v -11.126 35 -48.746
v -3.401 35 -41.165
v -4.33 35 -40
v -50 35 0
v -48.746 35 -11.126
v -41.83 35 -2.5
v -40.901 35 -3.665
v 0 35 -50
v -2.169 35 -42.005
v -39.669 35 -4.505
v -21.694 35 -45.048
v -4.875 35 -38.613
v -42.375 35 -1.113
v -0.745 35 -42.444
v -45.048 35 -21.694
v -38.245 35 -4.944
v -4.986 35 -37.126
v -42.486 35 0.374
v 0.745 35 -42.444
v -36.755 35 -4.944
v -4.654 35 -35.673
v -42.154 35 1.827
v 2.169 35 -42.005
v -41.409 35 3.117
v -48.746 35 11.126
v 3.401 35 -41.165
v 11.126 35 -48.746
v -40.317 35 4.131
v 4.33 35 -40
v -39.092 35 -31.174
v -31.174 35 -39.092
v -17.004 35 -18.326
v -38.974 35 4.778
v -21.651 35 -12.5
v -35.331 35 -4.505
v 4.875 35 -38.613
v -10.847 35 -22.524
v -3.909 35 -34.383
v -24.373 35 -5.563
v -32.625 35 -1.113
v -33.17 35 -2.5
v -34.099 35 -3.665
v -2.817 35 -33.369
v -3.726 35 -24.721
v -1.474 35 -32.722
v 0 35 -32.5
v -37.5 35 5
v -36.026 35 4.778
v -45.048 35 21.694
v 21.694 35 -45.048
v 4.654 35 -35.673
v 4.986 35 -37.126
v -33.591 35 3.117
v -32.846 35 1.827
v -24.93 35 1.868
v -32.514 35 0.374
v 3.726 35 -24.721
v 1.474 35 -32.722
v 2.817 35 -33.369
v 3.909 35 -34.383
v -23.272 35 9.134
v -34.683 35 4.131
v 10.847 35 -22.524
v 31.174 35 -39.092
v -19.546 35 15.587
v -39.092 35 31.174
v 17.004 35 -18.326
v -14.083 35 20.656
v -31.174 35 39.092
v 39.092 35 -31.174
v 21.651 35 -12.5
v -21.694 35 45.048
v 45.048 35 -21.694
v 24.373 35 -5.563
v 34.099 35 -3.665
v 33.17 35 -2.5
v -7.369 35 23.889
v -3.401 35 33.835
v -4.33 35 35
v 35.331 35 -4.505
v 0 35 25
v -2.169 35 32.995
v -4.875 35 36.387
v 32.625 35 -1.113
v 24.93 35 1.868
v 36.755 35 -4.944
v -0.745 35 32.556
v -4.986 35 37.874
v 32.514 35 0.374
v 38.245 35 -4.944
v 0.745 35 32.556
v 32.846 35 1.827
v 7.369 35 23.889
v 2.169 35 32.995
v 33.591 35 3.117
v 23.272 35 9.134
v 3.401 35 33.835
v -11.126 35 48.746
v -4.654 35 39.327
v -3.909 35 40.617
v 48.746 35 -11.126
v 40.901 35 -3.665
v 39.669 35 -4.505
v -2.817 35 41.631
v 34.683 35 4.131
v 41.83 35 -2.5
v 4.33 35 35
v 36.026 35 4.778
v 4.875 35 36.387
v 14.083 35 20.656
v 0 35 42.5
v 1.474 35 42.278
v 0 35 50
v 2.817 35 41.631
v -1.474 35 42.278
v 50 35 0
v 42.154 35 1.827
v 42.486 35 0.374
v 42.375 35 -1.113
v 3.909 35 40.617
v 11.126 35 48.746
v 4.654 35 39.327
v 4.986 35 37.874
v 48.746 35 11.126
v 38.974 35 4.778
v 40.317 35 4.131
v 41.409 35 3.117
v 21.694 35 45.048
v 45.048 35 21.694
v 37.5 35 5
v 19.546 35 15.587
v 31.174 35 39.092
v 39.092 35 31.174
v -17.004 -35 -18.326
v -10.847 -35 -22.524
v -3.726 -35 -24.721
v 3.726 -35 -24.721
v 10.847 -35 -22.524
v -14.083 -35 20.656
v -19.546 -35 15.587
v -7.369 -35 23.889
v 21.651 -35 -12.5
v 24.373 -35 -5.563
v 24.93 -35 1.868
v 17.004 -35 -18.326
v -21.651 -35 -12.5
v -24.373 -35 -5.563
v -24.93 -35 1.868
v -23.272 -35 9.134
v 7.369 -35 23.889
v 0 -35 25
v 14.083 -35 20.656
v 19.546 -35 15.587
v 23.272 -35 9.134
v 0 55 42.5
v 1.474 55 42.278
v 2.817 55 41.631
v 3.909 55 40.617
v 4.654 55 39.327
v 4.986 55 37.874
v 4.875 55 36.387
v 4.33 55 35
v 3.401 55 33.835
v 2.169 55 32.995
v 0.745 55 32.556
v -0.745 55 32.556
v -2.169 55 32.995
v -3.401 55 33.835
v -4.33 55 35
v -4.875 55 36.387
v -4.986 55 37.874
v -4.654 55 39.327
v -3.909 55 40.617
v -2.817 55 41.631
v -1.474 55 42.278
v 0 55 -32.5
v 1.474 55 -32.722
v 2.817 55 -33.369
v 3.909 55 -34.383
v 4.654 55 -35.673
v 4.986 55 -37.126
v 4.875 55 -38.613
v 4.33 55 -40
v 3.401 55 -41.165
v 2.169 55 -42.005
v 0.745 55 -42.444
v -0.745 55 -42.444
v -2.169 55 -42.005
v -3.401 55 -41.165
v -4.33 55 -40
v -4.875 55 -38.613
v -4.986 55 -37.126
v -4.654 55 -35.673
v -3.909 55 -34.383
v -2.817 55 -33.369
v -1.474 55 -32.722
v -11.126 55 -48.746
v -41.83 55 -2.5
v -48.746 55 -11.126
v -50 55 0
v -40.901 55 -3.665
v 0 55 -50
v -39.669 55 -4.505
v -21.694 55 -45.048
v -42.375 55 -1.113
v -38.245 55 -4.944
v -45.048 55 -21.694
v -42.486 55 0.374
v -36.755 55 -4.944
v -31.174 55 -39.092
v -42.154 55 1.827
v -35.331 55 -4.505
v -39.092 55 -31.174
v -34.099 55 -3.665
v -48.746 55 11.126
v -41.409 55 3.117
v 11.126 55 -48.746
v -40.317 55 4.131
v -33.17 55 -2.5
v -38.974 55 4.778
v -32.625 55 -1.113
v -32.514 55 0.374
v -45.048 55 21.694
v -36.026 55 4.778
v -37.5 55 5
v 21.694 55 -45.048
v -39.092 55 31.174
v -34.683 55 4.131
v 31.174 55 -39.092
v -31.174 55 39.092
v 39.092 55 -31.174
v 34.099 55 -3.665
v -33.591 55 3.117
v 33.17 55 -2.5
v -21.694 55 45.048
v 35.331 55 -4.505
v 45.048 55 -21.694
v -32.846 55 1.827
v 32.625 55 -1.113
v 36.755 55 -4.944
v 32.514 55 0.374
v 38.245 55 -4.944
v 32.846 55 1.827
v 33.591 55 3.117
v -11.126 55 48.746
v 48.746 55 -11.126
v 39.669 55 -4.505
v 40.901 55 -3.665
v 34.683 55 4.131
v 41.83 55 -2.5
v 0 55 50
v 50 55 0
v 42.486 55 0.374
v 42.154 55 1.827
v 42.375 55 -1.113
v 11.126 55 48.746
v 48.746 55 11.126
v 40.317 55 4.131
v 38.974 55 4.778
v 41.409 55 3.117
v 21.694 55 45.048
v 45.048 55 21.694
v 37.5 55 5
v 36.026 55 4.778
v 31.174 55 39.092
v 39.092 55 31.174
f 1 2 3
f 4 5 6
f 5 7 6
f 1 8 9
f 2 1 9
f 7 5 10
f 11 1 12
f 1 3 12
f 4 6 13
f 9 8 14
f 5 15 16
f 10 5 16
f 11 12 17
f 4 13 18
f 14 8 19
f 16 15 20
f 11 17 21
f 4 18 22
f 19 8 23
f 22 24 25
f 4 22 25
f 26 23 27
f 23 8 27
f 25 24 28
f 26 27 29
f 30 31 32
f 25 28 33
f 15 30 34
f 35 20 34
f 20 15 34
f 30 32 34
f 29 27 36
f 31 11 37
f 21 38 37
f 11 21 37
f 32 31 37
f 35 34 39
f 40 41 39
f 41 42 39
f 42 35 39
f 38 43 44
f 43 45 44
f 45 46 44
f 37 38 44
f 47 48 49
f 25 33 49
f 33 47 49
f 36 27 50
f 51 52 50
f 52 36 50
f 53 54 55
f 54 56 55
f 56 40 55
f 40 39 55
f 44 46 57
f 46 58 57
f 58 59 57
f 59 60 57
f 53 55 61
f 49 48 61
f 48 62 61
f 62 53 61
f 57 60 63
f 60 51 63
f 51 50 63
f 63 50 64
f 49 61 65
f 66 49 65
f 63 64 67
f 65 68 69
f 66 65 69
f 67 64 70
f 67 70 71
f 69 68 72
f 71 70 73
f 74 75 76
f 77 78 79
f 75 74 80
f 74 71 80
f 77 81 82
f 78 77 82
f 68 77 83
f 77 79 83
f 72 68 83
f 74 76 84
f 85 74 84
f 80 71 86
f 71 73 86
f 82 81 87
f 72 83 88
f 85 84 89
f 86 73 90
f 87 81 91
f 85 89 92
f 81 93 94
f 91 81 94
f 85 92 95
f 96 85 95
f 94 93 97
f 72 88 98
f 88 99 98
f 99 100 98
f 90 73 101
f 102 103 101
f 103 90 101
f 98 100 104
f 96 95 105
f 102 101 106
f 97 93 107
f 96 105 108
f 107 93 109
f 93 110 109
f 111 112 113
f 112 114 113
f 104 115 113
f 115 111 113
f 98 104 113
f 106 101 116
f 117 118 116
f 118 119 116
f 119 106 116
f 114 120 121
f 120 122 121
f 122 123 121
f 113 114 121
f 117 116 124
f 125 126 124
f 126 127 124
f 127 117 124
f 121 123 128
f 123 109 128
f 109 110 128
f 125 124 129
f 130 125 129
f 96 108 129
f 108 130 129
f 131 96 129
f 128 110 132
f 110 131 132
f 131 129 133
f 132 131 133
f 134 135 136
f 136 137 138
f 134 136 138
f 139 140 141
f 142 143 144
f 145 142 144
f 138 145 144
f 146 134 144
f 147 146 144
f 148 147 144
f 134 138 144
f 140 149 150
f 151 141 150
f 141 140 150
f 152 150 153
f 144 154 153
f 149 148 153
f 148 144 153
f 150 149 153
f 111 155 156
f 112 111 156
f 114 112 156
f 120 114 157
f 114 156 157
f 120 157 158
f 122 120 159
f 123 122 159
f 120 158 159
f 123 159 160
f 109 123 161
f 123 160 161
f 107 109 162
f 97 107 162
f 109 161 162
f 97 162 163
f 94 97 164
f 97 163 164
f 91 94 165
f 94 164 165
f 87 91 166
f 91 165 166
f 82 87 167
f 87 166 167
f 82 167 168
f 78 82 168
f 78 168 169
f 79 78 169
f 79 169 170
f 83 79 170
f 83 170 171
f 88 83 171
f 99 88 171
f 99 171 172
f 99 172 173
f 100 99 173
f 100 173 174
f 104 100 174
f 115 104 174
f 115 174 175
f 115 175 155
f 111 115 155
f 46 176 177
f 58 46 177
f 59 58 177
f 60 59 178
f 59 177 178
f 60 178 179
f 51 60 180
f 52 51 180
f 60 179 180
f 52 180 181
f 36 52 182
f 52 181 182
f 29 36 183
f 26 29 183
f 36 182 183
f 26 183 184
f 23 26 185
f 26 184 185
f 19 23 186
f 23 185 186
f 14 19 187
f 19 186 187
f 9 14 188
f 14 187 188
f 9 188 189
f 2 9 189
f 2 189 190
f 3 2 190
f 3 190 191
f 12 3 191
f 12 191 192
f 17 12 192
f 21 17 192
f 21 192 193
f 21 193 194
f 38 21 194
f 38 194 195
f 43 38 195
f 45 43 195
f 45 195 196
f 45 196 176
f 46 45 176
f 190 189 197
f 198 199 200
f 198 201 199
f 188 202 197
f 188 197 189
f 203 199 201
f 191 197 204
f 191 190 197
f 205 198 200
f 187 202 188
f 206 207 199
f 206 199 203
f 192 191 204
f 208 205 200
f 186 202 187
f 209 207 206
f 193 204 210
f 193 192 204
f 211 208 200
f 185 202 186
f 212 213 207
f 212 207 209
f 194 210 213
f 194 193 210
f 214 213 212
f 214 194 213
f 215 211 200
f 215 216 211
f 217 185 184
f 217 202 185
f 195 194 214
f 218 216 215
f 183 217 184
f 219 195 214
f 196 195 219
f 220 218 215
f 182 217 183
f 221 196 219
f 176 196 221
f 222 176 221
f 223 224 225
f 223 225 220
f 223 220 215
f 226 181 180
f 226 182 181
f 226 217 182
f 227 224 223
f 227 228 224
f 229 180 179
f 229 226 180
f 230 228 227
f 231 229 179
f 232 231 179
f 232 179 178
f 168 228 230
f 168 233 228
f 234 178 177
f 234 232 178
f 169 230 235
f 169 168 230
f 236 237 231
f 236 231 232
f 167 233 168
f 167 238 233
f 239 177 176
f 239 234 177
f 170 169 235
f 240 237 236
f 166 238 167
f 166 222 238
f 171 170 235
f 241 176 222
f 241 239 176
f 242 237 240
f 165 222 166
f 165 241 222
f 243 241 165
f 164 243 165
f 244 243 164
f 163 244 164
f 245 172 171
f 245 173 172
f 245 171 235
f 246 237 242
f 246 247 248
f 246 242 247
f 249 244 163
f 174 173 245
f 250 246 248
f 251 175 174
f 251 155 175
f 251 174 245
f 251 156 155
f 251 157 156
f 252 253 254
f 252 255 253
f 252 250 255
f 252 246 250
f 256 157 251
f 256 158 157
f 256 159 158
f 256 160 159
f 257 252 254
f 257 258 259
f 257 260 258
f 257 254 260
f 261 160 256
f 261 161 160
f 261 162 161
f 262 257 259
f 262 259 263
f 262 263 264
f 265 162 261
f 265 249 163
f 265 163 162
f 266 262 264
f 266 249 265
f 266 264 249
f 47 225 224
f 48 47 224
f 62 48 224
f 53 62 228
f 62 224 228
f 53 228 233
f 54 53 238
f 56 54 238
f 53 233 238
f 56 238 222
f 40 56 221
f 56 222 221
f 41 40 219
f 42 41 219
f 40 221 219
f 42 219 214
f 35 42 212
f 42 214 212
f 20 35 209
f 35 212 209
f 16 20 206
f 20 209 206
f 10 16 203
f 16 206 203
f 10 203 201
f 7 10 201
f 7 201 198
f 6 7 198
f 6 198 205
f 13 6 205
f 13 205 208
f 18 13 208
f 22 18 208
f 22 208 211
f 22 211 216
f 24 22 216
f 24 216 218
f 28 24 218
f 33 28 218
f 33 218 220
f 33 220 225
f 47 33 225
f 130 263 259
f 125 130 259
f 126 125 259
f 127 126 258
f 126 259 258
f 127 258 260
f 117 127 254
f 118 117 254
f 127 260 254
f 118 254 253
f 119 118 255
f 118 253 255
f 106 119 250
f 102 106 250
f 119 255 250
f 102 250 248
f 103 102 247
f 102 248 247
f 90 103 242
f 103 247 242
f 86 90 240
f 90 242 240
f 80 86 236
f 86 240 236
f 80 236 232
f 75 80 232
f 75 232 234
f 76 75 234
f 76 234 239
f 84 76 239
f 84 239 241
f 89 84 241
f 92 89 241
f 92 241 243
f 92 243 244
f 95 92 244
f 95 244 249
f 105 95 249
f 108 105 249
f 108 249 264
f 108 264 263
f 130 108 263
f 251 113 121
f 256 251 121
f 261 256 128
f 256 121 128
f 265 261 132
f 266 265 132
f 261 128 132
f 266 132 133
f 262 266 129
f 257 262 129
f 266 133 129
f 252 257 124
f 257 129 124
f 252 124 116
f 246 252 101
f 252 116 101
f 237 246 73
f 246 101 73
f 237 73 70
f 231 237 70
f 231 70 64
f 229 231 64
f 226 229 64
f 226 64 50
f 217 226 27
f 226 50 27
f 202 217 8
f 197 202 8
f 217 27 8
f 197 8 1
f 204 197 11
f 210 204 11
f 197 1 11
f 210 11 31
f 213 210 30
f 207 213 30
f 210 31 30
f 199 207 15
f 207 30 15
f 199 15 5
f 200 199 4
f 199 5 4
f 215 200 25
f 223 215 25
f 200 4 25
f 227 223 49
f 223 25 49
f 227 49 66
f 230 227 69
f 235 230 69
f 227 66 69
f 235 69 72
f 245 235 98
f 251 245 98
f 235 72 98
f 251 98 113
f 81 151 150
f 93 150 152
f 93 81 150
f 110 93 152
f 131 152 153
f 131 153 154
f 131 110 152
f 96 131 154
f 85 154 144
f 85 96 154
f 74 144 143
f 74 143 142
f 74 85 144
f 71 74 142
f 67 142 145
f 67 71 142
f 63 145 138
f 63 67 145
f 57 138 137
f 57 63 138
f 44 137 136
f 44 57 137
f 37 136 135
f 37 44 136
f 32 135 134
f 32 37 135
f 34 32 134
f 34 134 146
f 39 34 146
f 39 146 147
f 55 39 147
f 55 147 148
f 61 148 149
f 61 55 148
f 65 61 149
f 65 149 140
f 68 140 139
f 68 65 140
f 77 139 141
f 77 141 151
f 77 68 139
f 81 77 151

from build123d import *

# Parameters (mm, degrees)
CROQUIS1_R              = 25
SALIENTE_EXTRUIR1_DEPTH = 35
CROQUIS2_R              = 50
SALIENTE_EXTRUIR2_DEPTH = 20
CORTAR_EXTRUIR1_REACH   = 116.455
CROQUIS3_R              = 5


with BuildPart() as part:
    # Croquis1 → Saliente-Extruir1 (new, symmetric)
    with BuildSketch(Plane(origin=(0, 0, 0), x_dir=(1, 0, 0), z_dir=(0, 1, 0))):
        with Locations(Location((0, 0, 0), (0, 0, 270))):
            Circle(CROQUIS1_R)
    extrude(amount=SALIENTE_EXTRUIR1_DEPTH, both=True)

    # Croquis2 → Saliente-Extruir2 (add)
    with BuildSketch(Plane(origin=(0, 35, 0), x_dir=(1, 0, 0), z_dir=(0, 1, 0))):
        with Locations(Location((0, 0, 0), (0, 0, 270))):
            Circle(CROQUIS2_R)
    extrude(amount=SALIENTE_EXTRUIR2_DEPTH)

    # Croquis3 → Cortar-Extruir1 (cut, up to next)
    with BuildSketch(Plane(origin=(0, 55, 0), x_dir=(1, 0, 0), z_dir=(0, 1, 0)), mode=Mode.PRIVATE) as cortar_extruir1_sk1:
        with Locations(Location((0, 37.5, 0), (0, 0, 270))):
            Circle(CROQUIS3_R)
    cortar_extruir1_tool1 = extrude(cortar_extruir1_sk1.sketch, amount=-CORTAR_EXTRUIR1_REACH, mode=Mode.PRIVATE) & part.part
    # Croquis3 → Cortar-Extruir1 (cut, up to next)
    with BuildSketch(Plane(origin=(0, 55, 0), x_dir=(1, 0, 0), z_dir=(0, 1, 0)), mode=Mode.PRIVATE) as cortar_extruir1_sk2:
        with Locations(Location((37.5, 0, 0), (0, 0, 270))):
            Circle(CROQUIS3_R)
    cortar_extruir1_tool2 = extrude(cortar_extruir1_sk2.sketch, amount=-CORTAR_EXTRUIR1_REACH, mode=Mode.PRIVATE) & part.part
    # Croquis3 → Cortar-Extruir1 (cut, up to next)
    with BuildSketch(Plane(origin=(0, 55, 0), x_dir=(1, 0, 0), z_dir=(0, 1, 0)), mode=Mode.PRIVATE) as cortar_extruir1_sk3:
        with Locations(Location((0, -37.5, 0), (0, 0, 270))):
            Circle(CROQUIS3_R)
    cortar_extruir1_tool3 = extrude(cortar_extruir1_sk3.sketch, amount=-CORTAR_EXTRUIR1_REACH, mode=Mode.PRIVATE) & part.part
    # Croquis3 → Cortar-Extruir1 (cut, up to next)
    with BuildSketch(Plane(origin=(0, 55, 0), x_dir=(1, 0, 0), z_dir=(0, 1, 0)), mode=Mode.PRIVATE) as cortar_extruir1_sk4:
        with Locations(Location((-37.5, 0, 0), (0, 0, 270))):
            Circle(CROQUIS3_R)
    cortar_extruir1_tool4 = extrude(cortar_extruir1_sk4.sketch, amount=-CORTAR_EXTRUIR1_REACH, mode=Mode.PRIVATE) & part.part
    add(cortar_extruir1_tool1.solids().sort_by_distance((0, 55, -37.5))[0], mode=Mode.SUBTRACT)
    add(cortar_extruir1_tool2.solids().sort_by_distance((37.5, 55, 0))[0], mode=Mode.SUBTRACT)
    add(cortar_extruir1_tool3.solids().sort_by_distance((0, 55, 37.5))[0], mode=Mode.SUBTRACT)
    add(cortar_extruir1_tool4.solids().sort_by_distance((-37.5, 55, 0))[0], mode=Mode.SUBTRACT)


solid = part.part
